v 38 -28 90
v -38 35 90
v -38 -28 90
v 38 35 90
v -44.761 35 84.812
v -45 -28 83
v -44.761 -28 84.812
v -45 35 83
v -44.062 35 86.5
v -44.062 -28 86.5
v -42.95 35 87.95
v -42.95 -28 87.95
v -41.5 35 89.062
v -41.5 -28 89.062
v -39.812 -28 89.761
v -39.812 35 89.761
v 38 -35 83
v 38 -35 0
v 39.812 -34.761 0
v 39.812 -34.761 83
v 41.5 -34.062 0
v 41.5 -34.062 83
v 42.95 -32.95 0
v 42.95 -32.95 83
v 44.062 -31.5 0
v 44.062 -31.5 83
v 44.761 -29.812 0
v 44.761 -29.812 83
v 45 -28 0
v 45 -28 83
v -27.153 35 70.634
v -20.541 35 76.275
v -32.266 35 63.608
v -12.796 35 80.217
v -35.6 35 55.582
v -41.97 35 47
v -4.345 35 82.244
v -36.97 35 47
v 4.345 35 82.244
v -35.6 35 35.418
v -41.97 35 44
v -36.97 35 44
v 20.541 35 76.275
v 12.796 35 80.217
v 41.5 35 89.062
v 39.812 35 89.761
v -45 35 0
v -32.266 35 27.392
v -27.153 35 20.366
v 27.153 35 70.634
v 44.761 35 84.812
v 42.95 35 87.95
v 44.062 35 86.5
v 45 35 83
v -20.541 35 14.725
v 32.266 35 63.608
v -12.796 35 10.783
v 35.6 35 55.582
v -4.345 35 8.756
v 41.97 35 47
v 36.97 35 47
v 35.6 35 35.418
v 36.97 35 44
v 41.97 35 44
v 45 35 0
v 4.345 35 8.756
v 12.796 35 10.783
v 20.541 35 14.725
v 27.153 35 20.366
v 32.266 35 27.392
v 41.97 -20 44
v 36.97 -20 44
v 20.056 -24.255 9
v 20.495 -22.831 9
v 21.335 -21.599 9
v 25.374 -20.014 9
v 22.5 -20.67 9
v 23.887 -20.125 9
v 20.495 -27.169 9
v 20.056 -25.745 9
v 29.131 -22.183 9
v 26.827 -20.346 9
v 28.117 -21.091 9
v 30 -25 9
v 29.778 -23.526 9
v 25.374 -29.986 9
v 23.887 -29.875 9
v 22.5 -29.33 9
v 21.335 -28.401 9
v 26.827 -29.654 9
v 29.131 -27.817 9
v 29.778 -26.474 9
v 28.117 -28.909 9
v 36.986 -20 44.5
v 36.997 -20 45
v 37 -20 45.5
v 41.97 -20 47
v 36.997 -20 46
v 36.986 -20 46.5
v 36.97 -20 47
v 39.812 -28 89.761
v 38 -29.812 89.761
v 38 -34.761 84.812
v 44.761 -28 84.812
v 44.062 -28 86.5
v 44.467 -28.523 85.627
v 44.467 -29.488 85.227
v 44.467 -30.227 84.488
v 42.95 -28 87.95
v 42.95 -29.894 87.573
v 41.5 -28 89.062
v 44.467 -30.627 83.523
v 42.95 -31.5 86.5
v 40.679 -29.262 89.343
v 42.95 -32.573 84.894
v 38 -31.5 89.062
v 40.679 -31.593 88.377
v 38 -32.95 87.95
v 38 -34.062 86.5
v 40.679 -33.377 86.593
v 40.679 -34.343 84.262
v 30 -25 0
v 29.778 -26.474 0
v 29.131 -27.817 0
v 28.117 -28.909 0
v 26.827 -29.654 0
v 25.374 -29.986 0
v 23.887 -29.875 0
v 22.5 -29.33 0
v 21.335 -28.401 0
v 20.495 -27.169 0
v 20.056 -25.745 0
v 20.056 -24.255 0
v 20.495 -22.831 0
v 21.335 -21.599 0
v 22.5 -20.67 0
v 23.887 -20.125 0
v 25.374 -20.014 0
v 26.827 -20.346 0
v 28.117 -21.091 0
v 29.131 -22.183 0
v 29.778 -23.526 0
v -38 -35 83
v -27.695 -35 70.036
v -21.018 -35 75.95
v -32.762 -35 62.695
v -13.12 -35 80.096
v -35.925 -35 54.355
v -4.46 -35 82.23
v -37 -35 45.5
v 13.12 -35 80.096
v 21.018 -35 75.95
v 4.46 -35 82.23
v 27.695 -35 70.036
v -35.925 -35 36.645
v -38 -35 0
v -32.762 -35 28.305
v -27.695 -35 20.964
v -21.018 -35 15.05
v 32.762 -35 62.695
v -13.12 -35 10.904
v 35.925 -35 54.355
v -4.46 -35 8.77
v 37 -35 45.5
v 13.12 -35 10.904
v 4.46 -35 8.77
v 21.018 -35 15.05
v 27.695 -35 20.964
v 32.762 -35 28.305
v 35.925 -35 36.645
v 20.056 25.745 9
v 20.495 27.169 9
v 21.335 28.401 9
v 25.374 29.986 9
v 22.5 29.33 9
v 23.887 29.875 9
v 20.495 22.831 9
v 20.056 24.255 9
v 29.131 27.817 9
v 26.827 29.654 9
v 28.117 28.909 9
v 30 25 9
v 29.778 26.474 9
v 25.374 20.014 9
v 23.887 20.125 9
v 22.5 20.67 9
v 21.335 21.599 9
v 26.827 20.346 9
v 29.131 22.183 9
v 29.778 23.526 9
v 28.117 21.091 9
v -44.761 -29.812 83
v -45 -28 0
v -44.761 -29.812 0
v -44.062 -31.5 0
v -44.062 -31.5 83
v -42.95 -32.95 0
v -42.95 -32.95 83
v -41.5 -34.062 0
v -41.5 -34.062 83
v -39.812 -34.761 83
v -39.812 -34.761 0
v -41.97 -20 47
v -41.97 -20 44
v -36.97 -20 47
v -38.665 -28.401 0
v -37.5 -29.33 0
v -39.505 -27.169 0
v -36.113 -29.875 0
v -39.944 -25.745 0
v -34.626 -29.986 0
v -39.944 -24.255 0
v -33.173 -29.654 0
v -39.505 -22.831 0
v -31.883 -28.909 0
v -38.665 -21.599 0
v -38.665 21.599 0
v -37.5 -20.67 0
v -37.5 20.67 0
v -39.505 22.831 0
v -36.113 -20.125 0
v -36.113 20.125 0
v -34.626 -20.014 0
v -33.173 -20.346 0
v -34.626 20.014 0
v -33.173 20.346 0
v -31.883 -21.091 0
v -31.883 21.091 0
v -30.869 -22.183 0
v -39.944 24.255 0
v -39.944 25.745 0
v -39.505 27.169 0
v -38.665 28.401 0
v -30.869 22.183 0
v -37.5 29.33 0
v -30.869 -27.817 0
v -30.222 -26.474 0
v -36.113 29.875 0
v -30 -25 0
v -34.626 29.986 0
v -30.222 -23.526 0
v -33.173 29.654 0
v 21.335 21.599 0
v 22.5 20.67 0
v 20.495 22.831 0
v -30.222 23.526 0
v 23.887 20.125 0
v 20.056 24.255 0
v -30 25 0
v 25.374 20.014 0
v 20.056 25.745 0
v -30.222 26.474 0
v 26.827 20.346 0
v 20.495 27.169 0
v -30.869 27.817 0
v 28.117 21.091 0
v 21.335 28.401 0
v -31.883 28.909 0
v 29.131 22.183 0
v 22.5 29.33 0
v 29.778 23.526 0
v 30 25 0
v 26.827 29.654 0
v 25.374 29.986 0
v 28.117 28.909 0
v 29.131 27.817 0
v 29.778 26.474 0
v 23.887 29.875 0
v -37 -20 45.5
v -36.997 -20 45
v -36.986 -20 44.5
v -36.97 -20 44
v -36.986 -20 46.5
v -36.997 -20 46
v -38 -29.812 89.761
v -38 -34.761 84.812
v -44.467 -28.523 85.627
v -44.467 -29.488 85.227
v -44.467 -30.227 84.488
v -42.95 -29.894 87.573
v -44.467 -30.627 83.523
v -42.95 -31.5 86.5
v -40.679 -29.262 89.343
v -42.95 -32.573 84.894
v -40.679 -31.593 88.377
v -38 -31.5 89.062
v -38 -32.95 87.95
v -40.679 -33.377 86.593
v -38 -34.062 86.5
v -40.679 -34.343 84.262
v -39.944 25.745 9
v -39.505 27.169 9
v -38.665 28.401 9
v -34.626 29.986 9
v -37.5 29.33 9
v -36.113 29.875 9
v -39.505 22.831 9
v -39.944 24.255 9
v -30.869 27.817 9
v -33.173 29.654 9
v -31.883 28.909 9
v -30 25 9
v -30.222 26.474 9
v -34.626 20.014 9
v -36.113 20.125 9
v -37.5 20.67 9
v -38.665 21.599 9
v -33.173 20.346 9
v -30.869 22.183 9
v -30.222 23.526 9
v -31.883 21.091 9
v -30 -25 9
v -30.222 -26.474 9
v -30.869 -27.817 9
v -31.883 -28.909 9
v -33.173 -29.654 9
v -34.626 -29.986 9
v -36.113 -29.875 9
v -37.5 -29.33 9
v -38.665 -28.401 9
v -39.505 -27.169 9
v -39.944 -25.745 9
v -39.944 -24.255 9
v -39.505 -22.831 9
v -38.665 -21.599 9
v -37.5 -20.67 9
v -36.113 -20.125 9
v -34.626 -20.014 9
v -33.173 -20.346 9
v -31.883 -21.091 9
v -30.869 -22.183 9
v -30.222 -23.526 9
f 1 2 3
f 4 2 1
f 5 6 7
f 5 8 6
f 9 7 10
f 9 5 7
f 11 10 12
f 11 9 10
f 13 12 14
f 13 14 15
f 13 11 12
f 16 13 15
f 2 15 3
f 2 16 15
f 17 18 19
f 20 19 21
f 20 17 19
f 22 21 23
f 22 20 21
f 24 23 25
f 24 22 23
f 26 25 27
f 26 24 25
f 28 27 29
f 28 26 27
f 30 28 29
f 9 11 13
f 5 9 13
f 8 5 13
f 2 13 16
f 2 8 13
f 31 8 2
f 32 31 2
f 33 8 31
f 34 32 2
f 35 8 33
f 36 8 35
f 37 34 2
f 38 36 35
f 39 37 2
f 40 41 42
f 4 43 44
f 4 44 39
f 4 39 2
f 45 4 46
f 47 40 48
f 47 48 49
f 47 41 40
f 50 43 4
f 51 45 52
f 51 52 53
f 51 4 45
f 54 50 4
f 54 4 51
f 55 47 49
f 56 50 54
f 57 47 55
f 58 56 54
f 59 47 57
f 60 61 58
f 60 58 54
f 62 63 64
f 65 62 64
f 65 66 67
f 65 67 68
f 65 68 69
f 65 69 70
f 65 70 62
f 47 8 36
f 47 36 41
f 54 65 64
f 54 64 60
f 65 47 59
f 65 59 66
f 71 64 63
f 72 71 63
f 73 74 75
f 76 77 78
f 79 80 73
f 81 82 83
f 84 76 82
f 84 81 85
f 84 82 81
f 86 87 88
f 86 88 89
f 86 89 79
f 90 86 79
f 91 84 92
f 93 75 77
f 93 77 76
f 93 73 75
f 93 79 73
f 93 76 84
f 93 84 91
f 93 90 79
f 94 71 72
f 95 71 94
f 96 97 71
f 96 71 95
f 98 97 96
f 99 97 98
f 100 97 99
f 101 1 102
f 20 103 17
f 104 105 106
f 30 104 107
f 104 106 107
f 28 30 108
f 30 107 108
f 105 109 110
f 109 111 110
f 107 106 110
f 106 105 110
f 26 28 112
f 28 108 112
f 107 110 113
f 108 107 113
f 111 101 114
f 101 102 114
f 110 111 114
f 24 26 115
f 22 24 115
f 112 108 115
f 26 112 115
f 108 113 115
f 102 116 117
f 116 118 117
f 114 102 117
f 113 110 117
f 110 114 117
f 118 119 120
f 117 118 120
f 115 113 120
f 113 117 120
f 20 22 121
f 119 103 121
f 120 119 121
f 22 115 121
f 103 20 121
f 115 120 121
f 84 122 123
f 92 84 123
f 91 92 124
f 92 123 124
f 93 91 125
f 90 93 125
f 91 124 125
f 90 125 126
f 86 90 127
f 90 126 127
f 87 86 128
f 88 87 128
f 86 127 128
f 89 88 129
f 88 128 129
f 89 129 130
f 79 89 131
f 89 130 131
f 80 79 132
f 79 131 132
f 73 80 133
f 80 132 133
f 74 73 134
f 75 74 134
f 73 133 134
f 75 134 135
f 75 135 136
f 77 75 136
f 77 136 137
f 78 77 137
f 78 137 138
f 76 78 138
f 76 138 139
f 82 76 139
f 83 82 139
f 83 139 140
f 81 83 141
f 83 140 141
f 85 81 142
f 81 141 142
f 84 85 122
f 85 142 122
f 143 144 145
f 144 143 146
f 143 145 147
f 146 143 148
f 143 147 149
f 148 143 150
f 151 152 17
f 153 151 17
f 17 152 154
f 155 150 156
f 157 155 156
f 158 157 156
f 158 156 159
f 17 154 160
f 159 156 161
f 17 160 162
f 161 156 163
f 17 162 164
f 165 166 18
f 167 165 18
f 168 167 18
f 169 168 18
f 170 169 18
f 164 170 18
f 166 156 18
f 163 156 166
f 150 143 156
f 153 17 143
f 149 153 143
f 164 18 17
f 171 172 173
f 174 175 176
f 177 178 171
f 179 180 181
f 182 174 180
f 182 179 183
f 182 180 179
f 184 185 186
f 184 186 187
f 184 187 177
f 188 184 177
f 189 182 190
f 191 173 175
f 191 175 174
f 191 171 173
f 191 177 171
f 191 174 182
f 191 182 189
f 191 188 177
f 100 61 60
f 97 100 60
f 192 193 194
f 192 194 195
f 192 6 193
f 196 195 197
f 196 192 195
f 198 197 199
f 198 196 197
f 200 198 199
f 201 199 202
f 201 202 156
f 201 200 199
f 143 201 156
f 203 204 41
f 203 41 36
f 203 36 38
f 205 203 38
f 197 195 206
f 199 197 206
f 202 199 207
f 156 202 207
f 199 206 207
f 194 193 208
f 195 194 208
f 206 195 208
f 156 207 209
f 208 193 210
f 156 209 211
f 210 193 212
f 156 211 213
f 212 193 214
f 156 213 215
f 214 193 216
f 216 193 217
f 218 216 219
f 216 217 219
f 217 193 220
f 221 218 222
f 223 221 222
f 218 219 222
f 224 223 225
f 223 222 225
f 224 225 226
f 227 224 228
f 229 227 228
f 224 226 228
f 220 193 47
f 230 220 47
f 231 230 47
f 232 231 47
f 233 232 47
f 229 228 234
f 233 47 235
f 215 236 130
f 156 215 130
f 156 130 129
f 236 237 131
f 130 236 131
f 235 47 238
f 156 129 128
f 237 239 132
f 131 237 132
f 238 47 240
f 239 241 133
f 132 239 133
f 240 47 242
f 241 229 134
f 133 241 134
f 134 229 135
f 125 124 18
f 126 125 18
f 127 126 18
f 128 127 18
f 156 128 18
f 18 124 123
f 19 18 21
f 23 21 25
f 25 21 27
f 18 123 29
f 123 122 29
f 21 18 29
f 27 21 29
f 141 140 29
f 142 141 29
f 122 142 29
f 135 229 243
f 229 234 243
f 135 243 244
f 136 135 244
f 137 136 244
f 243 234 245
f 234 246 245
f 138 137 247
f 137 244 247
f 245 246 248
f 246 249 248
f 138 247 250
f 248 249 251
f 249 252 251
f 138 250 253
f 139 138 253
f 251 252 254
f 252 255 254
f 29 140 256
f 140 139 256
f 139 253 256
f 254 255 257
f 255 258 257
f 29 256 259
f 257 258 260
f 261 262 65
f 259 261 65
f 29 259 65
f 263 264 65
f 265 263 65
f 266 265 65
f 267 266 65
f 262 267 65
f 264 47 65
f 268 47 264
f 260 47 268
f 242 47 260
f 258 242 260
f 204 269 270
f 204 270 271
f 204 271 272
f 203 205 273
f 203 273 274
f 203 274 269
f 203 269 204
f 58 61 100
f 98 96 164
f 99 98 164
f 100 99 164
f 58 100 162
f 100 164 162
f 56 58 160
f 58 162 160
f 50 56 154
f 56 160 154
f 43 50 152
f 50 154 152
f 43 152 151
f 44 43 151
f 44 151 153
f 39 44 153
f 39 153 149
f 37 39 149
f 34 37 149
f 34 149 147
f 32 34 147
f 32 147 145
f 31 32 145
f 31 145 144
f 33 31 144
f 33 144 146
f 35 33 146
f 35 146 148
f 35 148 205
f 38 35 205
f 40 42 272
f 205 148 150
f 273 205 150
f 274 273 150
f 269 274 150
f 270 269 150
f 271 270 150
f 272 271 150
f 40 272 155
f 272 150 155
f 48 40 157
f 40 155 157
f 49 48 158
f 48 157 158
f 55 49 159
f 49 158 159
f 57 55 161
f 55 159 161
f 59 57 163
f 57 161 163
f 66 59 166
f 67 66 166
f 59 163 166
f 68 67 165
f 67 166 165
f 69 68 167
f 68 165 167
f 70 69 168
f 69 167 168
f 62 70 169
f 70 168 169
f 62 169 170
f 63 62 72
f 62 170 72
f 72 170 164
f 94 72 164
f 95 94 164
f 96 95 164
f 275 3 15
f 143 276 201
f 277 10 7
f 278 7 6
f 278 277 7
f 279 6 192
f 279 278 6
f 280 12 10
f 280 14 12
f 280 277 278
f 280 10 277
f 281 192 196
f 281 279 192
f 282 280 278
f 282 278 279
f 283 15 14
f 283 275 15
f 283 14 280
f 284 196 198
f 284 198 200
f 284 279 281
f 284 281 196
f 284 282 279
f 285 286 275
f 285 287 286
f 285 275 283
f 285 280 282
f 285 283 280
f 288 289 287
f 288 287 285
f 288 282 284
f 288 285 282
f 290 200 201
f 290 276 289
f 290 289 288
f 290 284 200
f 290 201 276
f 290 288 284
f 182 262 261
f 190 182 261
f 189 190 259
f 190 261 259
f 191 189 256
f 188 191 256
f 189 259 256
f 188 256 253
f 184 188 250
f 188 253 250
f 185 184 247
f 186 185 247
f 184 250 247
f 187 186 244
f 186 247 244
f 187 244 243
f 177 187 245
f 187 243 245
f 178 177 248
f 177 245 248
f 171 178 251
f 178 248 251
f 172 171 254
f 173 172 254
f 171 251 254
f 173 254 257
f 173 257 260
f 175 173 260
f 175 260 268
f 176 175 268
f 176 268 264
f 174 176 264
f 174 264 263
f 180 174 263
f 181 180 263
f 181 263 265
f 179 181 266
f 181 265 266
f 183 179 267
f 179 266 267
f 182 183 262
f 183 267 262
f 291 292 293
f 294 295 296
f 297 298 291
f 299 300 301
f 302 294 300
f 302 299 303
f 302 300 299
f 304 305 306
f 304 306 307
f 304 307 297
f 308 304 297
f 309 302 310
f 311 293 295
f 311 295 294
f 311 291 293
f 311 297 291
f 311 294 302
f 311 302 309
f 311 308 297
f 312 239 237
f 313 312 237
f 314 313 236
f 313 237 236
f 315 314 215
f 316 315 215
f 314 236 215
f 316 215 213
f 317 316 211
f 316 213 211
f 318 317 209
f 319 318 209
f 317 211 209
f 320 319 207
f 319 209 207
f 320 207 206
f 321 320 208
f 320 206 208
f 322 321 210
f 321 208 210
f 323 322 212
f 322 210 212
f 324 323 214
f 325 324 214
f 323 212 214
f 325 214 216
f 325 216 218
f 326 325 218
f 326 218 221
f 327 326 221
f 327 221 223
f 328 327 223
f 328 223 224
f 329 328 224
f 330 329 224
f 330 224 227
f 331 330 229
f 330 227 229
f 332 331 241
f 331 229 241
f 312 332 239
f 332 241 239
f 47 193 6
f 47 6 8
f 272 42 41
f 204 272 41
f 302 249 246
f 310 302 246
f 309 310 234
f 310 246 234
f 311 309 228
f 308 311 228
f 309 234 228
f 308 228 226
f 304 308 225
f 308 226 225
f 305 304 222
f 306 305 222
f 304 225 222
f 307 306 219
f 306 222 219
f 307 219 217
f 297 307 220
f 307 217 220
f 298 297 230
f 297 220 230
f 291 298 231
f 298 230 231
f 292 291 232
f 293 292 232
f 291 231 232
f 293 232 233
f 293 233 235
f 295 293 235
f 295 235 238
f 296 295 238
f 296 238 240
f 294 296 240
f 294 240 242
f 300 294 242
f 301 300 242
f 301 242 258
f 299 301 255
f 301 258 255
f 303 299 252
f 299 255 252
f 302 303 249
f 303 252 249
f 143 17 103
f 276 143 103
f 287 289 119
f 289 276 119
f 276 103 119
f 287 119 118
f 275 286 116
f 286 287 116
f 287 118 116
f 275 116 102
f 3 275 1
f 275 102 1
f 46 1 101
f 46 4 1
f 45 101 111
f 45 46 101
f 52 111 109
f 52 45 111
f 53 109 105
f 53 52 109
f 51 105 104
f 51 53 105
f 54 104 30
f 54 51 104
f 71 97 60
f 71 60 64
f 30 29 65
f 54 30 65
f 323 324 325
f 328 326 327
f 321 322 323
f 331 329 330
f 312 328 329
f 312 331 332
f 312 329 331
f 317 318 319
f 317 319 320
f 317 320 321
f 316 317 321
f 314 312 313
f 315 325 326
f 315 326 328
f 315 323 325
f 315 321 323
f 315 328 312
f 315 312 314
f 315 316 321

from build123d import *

# Parameters (mm, degrees)
F0_W     = 90
F0_H     = 70
F1_DEPTH = 90
F2_R     = 37
F3_DEPTH = 70
F4_R     = 5
F5_DEPTH = 9
F6_R     = 7
F8_DEPTH = 55


with BuildPart() as f1:
    # F0 (on Top) → F1 (new body)
    with BuildSketch(Plane.XY):
        Rectangle(F0_W, F0_H)
    extrude(amount=F1_DEPTH)

    # F2 (on face) → F3 (cut)
    with BuildSketch(Plane.XZ.offset(35)):
        with Locations((0, 45.5)):
            Circle(F2_R)
    extrude(amount=-F3_DEPTH, mode=Mode.SUBTRACT)

    # F4 (on face) → F5 (cut)
    with BuildSketch(Plane(origin=(0, 0, 0), x_dir=(1, 0, 0), z_dir=(0, 0, -1))):
        with Locations((-35, 25)):
            Circle(F4_R)
        with Locations((-35, -25)):
            Circle(F4_R)
        with Locations((25, 25)):
            Circle(F4_R)
        with Locations((25, -25)):
            Circle(F4_R)
    extrude(amount=-F5_DEPTH, mode=Mode.SUBTRACT)

    # F6
    f6_edges = [f1.edges().sort_by_distance(p)[0] for p in [
        (0, -35, 90),
        (45, 0, 90),
        (-45, 0, 90),
        (45, -35, 45),
        (-45, -35, 45),
    ]]
    fillet(f6_edges, radius=F6_R)

    # F7 (on face) → F8 (cut)
    with BuildSketch(Plane(origin=(0, 35, 0), x_dir=(-1, 0, 0), z_dir=(0, 1, 0))):
        with BuildLine():
            ThreePointArc((-36.9695820912, 44), (-37, 45.5), (-36.9695820912, 47))
            Line((-36.9695820912, 47), (-41.9695820912, 47))
            Line((-41.9695820912, 47), (-41.9695820912, 45.5))
            Line((-41.9695820912, 45.5), (-41.9695820912, 44))
            Line((-41.9695820912, 44), (-36.9695820912, 44))
        make_face()
        with BuildLine():
            Line((41.9695820912, 47), (36.9695820912, 47))
            ThreePointArc((36.9695820912, 47), (36.9923947412, 46.2501541923), (37, 45.5))
            ThreePointArc((37, 45.5), (36.9923947412, 44.7498458077), (36.9695820912, 44))
            Line((36.9695820912, 44), (41.9695820912, 44))
            Line((41.9695820912, 44), (41.9695820912, 45.5))
            Line((41.9695820912, 45.5), (41.9695820912, 47))
        make_face()
    extrude(amount=-F8_DEPTH, mode=Mode.SUBTRACT)


solid = f1.part
